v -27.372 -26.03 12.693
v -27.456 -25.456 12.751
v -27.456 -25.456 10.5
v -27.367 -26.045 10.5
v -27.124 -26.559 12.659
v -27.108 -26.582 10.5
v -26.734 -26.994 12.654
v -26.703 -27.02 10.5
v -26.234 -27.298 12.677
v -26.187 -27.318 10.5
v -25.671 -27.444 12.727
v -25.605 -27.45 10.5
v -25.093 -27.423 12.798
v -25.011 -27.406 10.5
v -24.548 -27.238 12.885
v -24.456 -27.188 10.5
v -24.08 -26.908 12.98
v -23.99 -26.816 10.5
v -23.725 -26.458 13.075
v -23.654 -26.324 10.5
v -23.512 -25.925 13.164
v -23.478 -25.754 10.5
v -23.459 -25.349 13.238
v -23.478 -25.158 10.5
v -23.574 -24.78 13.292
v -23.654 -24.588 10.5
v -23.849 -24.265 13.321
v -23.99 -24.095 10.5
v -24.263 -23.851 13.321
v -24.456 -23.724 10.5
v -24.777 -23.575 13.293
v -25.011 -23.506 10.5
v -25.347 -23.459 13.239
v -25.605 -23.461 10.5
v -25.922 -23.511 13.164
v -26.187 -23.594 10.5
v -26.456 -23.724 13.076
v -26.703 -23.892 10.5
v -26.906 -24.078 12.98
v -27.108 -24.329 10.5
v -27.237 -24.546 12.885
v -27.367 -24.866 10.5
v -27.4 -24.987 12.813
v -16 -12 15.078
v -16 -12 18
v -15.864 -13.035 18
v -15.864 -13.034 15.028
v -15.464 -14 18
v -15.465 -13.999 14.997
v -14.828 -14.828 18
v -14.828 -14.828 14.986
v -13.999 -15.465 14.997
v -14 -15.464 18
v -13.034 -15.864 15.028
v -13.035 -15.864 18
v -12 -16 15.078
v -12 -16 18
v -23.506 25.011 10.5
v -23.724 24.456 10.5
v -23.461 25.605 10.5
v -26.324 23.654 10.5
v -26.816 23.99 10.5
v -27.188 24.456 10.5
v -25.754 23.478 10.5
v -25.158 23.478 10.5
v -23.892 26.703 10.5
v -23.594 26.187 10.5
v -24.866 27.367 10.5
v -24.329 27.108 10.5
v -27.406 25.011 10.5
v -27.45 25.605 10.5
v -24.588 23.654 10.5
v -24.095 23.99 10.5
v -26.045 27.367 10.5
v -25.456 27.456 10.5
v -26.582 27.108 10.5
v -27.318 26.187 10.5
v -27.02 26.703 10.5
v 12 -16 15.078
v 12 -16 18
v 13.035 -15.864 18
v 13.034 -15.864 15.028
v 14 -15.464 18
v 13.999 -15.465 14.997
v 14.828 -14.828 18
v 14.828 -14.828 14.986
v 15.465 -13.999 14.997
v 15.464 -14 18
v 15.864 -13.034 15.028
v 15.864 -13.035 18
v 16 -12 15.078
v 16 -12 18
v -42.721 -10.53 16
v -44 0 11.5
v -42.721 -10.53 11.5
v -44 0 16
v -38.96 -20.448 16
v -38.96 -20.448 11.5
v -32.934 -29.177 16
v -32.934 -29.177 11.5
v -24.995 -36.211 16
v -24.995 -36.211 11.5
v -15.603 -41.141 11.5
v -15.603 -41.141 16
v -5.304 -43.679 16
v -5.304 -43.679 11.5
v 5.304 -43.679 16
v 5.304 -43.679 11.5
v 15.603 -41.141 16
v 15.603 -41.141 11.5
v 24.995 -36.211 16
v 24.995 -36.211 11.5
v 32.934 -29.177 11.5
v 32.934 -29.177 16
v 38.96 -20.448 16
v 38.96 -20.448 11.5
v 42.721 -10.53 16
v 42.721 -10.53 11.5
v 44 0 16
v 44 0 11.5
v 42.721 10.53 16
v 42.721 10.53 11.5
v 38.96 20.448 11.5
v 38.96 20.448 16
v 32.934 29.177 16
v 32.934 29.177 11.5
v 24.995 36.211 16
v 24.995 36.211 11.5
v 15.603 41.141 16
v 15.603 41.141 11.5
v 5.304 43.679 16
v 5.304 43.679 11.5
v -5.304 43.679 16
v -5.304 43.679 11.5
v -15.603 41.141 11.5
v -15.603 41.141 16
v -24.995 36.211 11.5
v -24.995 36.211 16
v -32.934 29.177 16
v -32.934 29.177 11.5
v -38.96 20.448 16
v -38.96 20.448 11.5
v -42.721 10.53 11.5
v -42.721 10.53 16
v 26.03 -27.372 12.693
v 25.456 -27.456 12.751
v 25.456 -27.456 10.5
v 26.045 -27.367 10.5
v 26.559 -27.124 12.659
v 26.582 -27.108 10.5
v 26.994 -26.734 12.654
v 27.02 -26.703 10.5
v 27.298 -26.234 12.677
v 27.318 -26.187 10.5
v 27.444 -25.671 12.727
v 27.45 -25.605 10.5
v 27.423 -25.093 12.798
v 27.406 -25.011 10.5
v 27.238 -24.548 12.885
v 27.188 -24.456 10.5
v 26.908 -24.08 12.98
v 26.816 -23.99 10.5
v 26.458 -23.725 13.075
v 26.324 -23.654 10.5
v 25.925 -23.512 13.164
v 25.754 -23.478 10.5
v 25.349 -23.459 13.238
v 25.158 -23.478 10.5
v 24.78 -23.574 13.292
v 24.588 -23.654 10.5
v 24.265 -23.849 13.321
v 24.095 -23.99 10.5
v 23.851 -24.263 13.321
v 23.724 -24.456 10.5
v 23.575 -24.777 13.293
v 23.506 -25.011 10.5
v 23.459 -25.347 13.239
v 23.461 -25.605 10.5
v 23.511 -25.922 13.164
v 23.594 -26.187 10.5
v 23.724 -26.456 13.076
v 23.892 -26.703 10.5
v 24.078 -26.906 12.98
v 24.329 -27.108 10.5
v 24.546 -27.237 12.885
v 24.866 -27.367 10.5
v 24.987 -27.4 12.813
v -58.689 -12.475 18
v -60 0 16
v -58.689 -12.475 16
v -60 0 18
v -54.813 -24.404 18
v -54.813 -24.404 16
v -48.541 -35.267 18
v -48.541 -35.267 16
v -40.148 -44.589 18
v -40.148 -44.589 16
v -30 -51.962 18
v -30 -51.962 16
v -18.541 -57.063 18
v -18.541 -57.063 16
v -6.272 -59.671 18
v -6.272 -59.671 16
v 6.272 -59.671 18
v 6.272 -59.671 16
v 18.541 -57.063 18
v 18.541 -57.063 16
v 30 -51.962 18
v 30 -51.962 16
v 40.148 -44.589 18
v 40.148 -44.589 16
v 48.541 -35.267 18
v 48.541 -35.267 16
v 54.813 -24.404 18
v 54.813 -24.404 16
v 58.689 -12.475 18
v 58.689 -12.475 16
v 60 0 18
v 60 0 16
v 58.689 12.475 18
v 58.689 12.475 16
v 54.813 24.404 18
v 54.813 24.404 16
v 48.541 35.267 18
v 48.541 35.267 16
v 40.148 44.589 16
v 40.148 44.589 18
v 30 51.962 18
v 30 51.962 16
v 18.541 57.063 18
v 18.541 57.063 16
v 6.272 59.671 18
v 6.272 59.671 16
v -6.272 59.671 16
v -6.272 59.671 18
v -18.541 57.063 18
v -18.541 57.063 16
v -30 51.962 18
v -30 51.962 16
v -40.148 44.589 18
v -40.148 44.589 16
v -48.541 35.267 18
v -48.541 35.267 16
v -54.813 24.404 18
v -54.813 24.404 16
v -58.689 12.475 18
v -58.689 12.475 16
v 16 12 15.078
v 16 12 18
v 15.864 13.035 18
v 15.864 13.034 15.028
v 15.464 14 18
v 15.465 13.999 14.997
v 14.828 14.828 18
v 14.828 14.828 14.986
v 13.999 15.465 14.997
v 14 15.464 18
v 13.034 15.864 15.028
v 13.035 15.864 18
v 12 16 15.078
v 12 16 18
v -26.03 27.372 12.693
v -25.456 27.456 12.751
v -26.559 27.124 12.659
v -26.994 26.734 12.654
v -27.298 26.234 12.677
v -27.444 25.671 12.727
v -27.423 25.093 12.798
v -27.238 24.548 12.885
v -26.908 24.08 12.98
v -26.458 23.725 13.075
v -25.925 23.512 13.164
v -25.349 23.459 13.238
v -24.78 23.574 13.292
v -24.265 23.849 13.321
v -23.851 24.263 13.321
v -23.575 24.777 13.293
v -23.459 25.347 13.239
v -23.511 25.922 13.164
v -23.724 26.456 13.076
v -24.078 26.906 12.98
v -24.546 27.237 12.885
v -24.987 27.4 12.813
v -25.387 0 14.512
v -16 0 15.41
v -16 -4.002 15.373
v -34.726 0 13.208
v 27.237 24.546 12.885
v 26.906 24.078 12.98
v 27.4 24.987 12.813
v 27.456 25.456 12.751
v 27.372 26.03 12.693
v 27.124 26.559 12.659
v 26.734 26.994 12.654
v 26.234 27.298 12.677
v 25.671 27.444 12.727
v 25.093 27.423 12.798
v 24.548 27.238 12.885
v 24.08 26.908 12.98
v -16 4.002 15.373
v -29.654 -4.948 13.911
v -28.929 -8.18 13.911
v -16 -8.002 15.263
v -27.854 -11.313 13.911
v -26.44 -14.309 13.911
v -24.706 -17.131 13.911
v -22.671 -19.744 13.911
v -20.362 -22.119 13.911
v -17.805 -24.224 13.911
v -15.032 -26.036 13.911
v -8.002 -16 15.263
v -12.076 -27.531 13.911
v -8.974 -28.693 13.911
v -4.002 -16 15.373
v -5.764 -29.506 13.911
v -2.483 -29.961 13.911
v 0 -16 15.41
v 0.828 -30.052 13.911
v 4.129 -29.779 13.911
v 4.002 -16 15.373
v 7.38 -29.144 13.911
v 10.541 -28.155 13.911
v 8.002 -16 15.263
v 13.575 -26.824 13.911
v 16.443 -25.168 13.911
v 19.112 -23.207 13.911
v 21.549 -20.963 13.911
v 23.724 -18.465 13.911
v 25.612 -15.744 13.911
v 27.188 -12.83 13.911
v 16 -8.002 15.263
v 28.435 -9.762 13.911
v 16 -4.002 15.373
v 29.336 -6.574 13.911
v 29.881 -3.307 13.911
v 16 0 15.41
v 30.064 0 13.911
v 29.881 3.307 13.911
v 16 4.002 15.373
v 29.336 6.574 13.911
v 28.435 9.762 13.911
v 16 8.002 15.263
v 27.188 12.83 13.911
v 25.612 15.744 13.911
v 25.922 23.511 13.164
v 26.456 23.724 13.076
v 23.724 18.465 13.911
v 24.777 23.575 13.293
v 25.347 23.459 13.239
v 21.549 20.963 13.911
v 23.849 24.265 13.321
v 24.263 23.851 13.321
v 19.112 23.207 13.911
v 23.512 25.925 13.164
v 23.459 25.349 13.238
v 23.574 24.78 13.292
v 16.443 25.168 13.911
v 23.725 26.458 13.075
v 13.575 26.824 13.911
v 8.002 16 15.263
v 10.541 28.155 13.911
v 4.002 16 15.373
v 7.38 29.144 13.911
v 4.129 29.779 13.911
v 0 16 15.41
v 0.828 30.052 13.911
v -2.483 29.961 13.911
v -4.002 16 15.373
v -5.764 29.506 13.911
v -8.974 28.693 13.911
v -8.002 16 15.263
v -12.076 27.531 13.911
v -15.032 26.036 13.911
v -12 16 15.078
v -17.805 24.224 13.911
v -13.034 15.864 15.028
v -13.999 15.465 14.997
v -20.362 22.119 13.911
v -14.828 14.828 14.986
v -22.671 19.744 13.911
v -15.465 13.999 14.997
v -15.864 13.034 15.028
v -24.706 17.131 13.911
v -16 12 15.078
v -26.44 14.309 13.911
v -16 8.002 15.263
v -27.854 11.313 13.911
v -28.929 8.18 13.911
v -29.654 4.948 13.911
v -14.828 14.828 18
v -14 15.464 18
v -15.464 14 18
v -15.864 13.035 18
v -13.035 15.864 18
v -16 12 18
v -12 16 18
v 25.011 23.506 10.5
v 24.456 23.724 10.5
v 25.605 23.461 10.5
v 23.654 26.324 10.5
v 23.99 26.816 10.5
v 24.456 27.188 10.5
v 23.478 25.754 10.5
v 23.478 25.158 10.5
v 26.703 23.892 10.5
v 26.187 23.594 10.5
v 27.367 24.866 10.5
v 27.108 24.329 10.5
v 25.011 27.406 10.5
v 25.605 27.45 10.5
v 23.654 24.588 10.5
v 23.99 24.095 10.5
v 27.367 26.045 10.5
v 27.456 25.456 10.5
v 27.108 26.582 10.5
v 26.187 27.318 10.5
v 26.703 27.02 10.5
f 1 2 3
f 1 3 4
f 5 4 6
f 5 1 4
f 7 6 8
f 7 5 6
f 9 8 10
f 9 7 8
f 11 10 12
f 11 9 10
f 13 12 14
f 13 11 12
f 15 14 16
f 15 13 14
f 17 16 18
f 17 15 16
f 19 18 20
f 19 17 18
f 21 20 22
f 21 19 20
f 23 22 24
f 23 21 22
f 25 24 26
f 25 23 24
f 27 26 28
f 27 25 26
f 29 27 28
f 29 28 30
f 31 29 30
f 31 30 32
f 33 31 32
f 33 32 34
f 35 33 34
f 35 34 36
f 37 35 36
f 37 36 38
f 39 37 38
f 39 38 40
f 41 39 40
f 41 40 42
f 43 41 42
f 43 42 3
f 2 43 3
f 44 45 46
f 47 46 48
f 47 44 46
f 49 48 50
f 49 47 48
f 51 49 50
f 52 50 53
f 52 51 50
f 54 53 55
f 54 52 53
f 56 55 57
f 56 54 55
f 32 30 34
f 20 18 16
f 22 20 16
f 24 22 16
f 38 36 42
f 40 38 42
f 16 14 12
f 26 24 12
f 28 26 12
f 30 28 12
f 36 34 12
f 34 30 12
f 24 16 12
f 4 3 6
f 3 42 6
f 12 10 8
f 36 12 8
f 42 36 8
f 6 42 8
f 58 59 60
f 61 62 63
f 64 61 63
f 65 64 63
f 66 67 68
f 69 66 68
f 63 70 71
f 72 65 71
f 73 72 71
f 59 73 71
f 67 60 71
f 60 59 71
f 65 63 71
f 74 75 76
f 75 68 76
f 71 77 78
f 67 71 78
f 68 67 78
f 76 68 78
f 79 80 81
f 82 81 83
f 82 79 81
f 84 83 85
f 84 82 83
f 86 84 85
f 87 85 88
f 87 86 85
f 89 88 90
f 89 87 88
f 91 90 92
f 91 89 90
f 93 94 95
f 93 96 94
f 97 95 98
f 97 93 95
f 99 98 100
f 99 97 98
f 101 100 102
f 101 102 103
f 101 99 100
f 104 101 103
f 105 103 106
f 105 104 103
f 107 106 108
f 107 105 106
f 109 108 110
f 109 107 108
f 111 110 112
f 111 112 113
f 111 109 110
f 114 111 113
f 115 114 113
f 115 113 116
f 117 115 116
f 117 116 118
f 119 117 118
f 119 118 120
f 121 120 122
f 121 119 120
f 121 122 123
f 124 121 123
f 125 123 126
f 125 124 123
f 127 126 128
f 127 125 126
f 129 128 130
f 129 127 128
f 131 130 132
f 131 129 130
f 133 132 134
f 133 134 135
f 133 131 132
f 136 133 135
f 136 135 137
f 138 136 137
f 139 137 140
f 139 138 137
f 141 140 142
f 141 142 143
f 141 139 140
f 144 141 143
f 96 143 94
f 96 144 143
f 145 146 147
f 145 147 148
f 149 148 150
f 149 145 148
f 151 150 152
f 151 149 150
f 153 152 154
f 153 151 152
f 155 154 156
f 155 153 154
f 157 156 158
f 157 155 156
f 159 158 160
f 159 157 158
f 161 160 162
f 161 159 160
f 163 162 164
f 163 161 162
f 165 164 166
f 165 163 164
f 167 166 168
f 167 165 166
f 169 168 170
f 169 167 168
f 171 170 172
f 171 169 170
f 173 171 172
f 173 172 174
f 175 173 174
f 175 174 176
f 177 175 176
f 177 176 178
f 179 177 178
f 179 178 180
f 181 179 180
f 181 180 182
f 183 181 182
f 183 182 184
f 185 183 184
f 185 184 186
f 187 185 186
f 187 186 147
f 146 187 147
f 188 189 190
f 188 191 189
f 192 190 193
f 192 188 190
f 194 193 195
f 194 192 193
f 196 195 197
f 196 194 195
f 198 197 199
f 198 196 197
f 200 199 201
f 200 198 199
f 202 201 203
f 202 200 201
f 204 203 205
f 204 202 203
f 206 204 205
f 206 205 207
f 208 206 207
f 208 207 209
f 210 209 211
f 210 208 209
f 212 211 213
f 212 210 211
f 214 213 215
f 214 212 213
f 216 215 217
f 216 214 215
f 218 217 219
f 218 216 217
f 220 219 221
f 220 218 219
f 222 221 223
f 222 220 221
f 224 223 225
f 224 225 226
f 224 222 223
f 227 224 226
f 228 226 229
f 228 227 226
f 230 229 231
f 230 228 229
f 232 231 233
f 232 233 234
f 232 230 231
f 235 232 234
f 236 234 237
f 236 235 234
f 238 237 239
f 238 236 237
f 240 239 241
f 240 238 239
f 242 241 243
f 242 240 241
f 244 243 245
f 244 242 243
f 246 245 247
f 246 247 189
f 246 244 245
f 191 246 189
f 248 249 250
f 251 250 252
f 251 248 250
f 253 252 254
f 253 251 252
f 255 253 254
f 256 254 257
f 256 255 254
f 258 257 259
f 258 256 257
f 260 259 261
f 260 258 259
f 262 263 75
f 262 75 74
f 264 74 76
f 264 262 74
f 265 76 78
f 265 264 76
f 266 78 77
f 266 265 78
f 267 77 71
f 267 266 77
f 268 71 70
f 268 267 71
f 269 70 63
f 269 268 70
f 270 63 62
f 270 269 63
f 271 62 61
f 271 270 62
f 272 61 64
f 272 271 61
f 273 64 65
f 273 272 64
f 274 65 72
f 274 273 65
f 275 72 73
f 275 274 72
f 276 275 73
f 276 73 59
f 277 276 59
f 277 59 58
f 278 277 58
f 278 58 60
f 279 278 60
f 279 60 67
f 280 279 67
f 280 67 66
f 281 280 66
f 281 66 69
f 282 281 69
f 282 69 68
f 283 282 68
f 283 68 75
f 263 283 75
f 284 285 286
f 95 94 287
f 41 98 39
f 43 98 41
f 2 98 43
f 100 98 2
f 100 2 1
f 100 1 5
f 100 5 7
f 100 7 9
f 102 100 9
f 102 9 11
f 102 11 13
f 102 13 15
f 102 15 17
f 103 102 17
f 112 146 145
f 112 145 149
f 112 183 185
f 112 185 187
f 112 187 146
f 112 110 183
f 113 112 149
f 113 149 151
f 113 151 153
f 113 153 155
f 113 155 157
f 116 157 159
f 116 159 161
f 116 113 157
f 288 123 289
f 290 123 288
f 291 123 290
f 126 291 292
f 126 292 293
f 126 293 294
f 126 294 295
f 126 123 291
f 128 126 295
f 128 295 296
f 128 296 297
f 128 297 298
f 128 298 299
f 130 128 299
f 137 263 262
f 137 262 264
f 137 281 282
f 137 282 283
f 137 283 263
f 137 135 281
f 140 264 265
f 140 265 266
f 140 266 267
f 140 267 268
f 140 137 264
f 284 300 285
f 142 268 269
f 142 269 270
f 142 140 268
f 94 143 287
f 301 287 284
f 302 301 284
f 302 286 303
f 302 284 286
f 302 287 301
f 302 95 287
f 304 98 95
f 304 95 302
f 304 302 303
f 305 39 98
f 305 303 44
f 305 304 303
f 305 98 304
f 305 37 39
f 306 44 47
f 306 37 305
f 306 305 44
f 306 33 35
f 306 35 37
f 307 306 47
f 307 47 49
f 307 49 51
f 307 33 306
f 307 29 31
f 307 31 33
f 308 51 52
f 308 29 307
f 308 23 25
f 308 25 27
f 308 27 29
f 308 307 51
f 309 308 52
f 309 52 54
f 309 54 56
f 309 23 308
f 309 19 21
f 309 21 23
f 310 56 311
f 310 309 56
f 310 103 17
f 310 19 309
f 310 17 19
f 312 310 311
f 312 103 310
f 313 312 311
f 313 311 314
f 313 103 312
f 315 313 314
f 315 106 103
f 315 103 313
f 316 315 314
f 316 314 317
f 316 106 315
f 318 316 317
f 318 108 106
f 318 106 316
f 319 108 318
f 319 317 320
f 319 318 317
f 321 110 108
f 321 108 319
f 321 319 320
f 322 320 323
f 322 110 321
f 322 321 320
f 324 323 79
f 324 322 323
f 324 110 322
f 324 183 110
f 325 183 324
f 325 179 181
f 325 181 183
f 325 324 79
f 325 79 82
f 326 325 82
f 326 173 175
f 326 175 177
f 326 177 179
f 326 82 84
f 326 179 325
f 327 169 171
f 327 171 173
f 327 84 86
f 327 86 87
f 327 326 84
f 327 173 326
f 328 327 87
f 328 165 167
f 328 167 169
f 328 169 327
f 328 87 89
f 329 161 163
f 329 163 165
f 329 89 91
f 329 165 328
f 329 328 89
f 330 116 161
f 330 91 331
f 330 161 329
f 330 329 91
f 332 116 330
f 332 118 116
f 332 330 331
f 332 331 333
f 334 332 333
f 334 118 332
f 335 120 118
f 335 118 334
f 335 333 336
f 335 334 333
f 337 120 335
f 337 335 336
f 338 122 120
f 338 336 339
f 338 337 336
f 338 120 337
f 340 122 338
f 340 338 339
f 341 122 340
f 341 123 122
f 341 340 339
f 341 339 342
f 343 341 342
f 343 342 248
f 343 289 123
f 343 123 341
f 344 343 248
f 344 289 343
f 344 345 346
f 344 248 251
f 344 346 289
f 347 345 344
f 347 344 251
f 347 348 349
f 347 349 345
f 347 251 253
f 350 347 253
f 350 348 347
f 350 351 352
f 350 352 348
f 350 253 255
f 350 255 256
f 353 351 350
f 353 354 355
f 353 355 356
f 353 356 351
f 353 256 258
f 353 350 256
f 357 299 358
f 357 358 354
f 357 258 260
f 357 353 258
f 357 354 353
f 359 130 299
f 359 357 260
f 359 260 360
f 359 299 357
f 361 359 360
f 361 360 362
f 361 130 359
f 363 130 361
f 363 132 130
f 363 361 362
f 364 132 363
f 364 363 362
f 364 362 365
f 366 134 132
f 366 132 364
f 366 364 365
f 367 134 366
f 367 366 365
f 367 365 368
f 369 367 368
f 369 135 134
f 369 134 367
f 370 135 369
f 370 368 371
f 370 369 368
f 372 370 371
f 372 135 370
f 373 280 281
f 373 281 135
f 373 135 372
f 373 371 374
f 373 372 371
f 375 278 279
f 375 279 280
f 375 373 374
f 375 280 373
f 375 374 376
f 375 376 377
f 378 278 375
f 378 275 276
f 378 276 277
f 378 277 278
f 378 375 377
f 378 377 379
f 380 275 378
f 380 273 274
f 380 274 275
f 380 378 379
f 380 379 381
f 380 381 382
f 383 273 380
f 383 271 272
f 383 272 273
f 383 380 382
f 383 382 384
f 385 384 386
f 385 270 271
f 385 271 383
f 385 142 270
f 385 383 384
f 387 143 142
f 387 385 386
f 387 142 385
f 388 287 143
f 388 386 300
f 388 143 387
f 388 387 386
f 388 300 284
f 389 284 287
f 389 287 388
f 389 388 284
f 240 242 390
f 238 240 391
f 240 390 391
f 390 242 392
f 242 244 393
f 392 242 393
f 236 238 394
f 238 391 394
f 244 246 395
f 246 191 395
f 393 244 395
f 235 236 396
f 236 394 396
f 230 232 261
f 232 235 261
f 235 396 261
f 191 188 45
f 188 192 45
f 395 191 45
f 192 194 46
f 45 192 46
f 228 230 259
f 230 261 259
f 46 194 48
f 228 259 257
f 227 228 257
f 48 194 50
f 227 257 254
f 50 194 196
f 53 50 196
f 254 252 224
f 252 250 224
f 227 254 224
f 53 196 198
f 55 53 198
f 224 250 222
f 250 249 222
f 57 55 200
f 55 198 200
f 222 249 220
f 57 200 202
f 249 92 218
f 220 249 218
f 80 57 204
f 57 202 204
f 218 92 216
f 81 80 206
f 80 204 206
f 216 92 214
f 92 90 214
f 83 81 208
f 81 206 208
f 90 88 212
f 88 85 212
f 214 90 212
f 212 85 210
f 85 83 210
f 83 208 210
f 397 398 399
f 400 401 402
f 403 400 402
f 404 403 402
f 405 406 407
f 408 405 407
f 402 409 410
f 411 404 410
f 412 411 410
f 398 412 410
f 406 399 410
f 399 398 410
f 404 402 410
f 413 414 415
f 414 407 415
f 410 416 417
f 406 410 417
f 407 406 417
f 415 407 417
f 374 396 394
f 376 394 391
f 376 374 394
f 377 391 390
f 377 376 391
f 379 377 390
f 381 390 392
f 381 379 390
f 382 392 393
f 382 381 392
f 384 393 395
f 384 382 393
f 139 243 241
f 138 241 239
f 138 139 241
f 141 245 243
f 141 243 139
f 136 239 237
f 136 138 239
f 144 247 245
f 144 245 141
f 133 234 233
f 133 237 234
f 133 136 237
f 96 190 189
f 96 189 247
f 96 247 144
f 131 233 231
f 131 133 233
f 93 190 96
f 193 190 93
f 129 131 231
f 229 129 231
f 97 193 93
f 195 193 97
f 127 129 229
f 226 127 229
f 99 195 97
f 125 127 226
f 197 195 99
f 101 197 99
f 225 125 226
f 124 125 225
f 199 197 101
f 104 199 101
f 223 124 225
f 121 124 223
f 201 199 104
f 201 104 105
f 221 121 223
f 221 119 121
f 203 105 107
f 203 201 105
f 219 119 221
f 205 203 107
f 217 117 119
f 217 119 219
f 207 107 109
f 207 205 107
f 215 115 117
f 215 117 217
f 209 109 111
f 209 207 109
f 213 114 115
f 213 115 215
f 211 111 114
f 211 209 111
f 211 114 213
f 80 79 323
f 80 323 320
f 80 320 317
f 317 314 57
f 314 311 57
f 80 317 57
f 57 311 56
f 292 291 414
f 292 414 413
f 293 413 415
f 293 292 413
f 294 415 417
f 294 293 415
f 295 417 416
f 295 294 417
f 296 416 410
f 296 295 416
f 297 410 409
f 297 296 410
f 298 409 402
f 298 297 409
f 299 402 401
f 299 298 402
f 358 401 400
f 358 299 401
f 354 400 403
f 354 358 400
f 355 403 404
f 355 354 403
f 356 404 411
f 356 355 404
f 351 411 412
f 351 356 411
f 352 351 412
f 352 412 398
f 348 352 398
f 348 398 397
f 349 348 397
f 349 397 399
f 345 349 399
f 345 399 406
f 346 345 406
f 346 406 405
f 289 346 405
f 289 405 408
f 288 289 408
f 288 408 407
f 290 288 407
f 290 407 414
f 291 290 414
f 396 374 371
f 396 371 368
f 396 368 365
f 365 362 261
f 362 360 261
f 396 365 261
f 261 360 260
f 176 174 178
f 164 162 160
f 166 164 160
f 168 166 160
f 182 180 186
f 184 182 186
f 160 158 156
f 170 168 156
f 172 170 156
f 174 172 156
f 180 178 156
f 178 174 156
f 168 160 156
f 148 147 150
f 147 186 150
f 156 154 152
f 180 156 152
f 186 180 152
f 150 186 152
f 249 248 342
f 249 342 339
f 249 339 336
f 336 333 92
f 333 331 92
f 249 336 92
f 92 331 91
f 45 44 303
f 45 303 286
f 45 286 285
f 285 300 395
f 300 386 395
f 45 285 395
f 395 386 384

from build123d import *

# Parameters (mm, degrees)
POCKET060_DEPTH       = 100
SKETCH263_R           = 2
PAD089_DEPTH          = 4
POLARPATTERN001_COUNT = 4


with BuildPart() as part:
    # Sketch113 → Revolution002 (revolve)
    with BuildSketch(Plane.XZ):
        with BuildLine():
            ThreePointArc((0, 16), (-22.1147575162, 14.8720734917), (-44, 11.5))
            Line((-44, 11.5), (-44, 16))
            Line((-44, 16), (-60, 16))
            Line((-60, 16), (-60, 18))
            Line((0, 18), (-60, 18))
            Line((0, 16), (0, 18))
        make_face()
    revolve(axis=Axis((0, 0, 0), (0, 0, 1)))

    # Sketch114 → Pocket060 (cut)
    with BuildSketch(Plane.XY):
        with BuildLine():
            Line((-12, 16), (12, 16))
            ThreePointArc((16, 12), (14.8284271247, 14.8284271247), (12, 16))
            Line((16, 12), (16, -12))
            ThreePointArc((12, -16), (14.8284271247, -14.8284271247), (16, -12))
            Line((12, -16), (-12, -16))
            ThreePointArc((-16, -12), (-14.8284271247, -14.8284271247), (-12, -16))
            Line((-16, -12), (-16, 12))
            ThreePointArc((-12, 16), (-14.8284271247, 14.8284271247), (-16, 12))
        make_face()
    extrude(amount=POCKET060_DEPTH, mode=Mode.SUBTRACT)

    # Sketch263 → Pad089 (join)
    with BuildSketch(Plane.XY.offset(14.5)):
        with Locations((25.4558441227, 25.4558441227)):
            Circle(SKETCH263_R)
    pad089 = extrude(amount=-PAD089_DEPTH)

    # PolarPattern001: Pad089 ×4 about axis
    polarpattern001_axis = Axis((0, 0, 14.5), (0, 0, 1))
    for i in range(1, POLARPATTERN001_COUNT):
        add(pad089.rotate(polarpattern001_axis, i * 360 / POLARPATTERN001_COUNT))


solid = part.part
